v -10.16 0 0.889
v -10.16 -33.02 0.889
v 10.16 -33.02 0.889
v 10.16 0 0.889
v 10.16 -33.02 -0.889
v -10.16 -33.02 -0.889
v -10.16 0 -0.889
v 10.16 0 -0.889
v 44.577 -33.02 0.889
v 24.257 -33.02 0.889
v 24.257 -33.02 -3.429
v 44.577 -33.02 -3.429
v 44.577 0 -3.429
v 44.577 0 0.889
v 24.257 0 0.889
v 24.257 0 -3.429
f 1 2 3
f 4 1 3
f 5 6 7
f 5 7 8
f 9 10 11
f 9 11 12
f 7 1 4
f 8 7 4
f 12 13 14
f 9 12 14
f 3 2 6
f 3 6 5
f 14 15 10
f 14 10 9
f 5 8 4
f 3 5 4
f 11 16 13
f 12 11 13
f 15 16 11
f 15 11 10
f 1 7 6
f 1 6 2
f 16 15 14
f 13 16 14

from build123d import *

# Parameters (mm, degrees)
F0_W     = 20.32
F0_H     = 1.778
F1_DEPTH = 33.02
F0_H_2   = 4.318
F2_DEPTH = 33.02


with BuildPart() as f1:
    # F0 (on Front) → F1 (new body)
    with BuildSketch(Plane.XZ):
        Rectangle(F0_W, F0_H)
    extrude(amount=F1_DEPTH)

    # F0 (on Front) → F2 (join)
    with BuildSketch(Plane.XZ):
        Rectangle(F0_W, F0_H)
        with Locations((34.416999, -1.27)):
            Rectangle(F0_W, F0_H_2)
    extrude(amount=F2_DEPTH)


solid = f1.part
